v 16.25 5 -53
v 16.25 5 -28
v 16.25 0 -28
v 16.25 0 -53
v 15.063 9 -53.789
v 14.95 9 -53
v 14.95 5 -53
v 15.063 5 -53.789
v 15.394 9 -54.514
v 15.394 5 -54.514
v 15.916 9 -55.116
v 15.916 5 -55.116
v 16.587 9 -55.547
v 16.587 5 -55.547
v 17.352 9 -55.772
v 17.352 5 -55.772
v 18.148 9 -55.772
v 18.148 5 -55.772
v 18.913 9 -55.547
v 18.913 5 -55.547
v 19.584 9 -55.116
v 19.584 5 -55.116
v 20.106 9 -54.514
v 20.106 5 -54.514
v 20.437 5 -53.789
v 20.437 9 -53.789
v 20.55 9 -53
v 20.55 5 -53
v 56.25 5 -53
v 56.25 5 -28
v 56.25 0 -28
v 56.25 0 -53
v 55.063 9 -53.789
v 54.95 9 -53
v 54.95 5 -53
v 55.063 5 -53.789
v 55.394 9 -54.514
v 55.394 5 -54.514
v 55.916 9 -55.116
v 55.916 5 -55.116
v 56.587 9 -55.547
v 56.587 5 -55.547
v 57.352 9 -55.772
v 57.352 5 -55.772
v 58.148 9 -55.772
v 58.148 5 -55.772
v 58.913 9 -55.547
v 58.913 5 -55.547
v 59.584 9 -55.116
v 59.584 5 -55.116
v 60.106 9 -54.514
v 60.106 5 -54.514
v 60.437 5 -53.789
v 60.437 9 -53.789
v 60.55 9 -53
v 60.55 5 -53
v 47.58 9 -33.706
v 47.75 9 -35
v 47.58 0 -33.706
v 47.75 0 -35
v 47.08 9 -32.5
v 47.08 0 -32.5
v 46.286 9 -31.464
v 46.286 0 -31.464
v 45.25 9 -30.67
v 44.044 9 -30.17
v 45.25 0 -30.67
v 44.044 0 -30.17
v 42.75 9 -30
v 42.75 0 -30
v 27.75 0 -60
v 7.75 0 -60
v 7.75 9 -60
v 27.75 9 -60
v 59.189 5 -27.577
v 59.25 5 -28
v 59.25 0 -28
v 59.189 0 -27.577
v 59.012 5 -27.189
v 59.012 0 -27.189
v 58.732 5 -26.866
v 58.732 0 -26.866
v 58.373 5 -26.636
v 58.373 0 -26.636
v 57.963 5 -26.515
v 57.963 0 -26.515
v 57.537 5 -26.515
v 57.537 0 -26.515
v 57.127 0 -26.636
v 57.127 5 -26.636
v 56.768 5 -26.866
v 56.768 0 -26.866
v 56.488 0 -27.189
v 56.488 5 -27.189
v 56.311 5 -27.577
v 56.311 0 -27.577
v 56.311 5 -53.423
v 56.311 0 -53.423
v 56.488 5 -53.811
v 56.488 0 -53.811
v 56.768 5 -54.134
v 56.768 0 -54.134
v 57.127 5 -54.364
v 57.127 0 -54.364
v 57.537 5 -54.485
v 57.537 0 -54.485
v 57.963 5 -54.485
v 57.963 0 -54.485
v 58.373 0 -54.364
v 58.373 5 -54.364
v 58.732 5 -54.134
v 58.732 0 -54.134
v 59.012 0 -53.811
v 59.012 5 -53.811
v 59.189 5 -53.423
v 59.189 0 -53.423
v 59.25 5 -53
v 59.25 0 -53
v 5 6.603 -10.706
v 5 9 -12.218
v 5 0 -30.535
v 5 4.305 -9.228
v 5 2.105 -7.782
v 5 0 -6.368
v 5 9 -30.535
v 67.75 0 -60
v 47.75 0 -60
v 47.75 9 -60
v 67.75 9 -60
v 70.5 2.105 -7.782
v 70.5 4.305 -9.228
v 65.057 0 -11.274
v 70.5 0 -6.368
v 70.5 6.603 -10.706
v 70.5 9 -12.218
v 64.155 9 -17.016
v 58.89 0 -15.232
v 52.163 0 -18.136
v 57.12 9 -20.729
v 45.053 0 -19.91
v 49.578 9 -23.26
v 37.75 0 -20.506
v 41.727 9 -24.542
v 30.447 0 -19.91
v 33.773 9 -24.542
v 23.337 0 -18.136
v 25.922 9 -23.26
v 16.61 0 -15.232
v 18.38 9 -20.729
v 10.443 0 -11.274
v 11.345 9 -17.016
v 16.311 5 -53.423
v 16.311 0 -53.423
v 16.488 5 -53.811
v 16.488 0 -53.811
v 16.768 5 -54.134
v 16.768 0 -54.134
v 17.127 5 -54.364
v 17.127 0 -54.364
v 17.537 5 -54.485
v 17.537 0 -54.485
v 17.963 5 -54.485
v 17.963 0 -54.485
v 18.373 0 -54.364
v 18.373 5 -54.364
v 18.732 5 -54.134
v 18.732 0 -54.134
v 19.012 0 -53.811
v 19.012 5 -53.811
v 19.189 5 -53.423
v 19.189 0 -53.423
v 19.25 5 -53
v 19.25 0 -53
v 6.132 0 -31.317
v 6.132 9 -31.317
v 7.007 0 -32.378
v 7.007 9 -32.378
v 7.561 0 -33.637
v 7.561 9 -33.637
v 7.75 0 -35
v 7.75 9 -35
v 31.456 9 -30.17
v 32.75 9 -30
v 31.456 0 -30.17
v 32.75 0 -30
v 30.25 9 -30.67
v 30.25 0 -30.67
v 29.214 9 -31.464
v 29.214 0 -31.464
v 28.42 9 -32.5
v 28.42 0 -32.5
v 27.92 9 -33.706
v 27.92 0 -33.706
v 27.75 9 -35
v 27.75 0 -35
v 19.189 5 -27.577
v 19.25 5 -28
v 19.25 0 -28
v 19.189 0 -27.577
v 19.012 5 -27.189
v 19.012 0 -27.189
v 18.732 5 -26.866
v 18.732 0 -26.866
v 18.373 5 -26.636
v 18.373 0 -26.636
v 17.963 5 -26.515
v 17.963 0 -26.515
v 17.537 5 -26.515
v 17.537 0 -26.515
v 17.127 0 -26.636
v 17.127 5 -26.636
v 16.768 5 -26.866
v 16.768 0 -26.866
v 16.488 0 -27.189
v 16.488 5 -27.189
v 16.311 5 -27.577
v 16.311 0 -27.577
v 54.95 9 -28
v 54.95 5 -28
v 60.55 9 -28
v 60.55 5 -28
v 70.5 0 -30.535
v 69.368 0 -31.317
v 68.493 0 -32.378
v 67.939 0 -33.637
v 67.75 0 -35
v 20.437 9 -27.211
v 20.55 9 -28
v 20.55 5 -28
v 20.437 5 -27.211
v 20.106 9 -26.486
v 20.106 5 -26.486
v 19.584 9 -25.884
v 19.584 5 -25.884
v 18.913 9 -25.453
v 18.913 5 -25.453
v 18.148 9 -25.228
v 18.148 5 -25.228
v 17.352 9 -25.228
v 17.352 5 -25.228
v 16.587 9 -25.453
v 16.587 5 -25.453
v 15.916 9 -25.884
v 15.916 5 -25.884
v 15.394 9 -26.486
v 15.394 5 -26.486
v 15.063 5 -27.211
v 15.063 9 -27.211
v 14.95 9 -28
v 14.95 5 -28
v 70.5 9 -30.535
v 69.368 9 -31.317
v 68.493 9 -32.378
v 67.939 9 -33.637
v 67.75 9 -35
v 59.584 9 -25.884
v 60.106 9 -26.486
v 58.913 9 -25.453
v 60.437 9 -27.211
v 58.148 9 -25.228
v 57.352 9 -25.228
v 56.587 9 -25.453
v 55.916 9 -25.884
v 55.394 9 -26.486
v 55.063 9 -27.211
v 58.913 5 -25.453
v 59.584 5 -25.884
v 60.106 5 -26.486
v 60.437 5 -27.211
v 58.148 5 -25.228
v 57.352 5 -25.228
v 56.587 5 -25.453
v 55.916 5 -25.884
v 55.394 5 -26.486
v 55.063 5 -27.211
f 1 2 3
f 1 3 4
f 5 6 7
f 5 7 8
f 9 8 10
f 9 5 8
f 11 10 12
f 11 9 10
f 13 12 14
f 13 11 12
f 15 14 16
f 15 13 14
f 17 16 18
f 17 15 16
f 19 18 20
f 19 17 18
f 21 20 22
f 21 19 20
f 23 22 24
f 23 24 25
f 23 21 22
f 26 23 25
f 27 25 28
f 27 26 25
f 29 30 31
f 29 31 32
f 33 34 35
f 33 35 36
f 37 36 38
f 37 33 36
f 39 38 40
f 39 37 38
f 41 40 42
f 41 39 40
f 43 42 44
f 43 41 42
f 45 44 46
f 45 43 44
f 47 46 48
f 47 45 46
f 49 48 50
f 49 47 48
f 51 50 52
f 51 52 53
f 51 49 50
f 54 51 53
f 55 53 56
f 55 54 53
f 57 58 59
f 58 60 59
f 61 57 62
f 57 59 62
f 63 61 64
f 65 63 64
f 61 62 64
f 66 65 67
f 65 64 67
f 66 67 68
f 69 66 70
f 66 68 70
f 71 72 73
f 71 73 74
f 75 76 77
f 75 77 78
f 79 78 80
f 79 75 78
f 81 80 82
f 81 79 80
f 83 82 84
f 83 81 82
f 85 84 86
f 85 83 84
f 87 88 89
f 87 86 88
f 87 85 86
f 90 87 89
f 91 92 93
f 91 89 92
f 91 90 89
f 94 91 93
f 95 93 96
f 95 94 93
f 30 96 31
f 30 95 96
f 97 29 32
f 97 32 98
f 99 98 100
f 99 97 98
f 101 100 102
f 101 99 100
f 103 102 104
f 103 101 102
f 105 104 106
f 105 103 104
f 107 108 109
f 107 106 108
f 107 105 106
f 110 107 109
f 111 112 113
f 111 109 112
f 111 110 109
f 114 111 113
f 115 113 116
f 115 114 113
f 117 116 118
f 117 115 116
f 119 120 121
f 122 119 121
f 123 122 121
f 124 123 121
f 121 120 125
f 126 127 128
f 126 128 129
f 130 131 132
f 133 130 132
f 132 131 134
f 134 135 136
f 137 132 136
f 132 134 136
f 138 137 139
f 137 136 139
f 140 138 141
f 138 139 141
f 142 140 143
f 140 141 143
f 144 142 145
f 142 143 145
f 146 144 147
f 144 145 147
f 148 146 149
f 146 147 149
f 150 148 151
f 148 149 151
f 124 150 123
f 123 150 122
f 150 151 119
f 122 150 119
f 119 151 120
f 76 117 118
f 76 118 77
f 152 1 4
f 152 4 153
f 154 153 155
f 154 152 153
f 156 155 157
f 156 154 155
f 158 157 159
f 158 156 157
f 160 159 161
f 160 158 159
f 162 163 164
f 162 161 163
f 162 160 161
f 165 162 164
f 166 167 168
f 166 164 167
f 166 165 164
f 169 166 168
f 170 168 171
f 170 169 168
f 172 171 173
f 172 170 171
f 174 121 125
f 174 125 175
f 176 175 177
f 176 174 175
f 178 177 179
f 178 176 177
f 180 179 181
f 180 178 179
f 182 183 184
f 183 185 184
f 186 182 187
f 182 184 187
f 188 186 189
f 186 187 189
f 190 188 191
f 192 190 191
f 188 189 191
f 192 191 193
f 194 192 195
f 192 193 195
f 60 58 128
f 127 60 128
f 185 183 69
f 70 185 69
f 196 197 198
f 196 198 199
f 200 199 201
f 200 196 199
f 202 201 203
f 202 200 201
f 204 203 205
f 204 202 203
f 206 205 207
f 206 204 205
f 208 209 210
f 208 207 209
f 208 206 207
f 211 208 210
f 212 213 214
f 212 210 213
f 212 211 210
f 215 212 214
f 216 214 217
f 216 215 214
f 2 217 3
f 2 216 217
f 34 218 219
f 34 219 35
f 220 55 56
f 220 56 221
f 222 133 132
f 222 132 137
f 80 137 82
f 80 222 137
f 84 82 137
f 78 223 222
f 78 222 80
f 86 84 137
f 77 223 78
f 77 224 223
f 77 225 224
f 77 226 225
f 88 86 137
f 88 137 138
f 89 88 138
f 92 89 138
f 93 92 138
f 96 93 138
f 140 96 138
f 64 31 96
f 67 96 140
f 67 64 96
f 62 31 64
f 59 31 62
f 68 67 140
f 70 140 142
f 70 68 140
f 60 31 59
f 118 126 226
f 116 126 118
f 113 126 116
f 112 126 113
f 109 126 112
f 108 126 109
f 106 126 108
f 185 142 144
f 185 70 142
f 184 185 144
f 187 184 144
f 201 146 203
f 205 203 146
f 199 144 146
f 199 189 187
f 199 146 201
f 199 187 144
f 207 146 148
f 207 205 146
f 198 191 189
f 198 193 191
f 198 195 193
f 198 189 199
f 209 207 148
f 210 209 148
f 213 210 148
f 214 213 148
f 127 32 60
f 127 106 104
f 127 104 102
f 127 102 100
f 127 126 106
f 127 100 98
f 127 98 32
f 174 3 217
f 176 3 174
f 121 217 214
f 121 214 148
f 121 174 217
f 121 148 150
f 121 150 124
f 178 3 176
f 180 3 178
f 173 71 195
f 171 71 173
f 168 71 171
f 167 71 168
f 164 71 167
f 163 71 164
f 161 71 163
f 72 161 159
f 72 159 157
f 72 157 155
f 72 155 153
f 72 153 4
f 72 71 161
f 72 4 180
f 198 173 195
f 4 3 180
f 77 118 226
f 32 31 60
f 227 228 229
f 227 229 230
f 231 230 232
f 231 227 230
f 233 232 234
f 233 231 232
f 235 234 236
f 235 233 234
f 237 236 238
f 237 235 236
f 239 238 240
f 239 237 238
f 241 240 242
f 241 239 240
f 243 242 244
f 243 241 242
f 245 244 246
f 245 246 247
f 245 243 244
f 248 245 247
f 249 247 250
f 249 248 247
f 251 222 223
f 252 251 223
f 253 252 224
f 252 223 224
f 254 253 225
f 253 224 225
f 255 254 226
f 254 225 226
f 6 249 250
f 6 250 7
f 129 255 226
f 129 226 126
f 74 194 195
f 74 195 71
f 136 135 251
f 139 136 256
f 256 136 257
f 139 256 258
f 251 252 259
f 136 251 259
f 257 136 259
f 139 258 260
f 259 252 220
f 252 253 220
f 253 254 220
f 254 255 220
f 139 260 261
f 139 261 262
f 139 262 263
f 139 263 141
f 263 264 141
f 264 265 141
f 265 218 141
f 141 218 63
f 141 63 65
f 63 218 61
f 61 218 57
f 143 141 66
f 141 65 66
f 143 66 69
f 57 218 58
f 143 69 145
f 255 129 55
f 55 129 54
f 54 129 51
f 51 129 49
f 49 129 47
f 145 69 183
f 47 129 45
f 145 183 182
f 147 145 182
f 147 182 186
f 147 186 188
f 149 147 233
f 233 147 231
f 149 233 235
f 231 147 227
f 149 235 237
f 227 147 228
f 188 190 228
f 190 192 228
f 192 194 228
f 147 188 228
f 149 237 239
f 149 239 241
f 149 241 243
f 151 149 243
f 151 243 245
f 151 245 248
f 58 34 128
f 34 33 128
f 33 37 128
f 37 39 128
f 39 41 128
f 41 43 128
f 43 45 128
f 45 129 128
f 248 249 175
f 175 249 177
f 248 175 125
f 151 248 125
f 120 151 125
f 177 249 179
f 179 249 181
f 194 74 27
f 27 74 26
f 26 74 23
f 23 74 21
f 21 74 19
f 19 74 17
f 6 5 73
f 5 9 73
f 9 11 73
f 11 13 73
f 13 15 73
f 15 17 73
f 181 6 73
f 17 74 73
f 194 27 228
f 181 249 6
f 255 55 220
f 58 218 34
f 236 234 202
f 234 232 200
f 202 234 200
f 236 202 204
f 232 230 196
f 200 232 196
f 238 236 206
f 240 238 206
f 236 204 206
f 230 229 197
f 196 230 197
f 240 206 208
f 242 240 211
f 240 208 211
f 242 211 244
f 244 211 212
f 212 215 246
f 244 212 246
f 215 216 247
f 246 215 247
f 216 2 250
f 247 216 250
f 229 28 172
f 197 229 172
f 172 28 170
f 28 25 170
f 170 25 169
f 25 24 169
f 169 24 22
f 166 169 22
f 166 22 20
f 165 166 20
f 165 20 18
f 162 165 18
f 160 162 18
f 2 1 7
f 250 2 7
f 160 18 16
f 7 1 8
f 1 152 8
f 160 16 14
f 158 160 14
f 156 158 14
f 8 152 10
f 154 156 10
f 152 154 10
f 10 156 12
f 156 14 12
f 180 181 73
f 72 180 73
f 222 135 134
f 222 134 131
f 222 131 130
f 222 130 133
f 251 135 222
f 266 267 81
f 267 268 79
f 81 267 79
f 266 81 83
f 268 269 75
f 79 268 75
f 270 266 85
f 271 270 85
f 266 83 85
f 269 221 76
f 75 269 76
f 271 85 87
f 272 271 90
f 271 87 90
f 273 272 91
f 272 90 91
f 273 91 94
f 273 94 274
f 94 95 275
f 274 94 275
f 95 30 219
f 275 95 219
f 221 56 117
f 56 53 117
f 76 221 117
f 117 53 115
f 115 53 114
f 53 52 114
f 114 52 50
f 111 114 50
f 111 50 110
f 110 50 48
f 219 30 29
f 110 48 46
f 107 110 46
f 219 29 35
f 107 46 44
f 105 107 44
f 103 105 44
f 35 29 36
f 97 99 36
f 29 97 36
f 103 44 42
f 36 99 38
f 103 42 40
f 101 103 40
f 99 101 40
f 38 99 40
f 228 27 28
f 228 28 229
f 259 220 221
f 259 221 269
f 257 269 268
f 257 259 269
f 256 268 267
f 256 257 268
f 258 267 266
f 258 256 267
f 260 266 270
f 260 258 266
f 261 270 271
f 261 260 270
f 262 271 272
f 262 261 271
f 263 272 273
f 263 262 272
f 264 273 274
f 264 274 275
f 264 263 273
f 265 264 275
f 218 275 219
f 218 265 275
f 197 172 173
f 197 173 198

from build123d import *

# Parameters (mm, degrees)
BOSS_EXTRUDE1_DEPTH = 9
CUT_EXTRUDE2_REACH  = 98.857
SKETCH5_W           = 20
SKETCH5_H           = 30
SKETCH5_W_2         = 7.75
CUT_EXTRUDE3_DEPTH  = 10
FILLET1_R           = 5
CUT_EXTRUDE4_DEPTH  = 4
CHAMFER1_SIZE       = 9
CHAMFER1_SIZE_2     = 4.196768923
CUT_EXTRUDE5_REACH  = 98.857
SKETCH7_W           = 5
SKETCH7_H           = 33.085129134
SKETCH7_H_2         = 33.745309592


with BuildPart() as part:
    # Sketch1 → Boss-Extrude1 (new body)
    with BuildSketch(Plane(origin=(0, 0, 0), x_dir=(1, 0, 0), z_dir=(0, 1, 0))):
        with BuildLine():
            Line((0, 0), (0, 60))
            Line((0, 60), (75.5, 60))
            Line((75.5, 60), (75.5, 0))
            ThreePointArc((75.5, 0), (37.75, 20.506378381), (0, 0))
        make_face()
    extrude(amount=BOSS_EXTRUDE1_DEPTH)

    # Sketch4 → Cut-Extrude2 (cut, up to next)
    with BuildSketch(Plane(origin=(0, 9, 0), x_dir=(1, 0, 0), z_dir=(0, 1, 0)), mode=Mode.PRIVATE) as cut_extrude2_sk1:
        with BuildLine():
            Line((19.25, 53), (19.25, 28))
            ThreePointArc((19.25, 28), (17.75, 26.5), (16.25, 28))
            Line((16.25, 28), (16.25, 53))
            ThreePointArc((16.25, 53), (17.75, 54.5), (19.25, 53))
        make_face()
    cut_extrude2_tool1 = extrude(cut_extrude2_sk1.sketch, amount=-CUT_EXTRUDE2_REACH, mode=Mode.PRIVATE) & part.part
    # Sketch4 → Cut-Extrude2 (cut, up to next)
    with BuildSketch(Plane(origin=(0, 9, 0), x_dir=(1, 0, 0), z_dir=(0, 1, 0)), mode=Mode.PRIVATE) as cut_extrude2_sk2:
        with BuildLine():
            Line((59.25, 53), (59.25, 28))
            ThreePointArc((59.25, 28), (57.75, 26.5), (56.25, 28))
            Line((56.25, 28), (56.25, 53))
            ThreePointArc((56.25, 53), (57.75, 54.5), (59.25, 53))
        make_face()
    cut_extrude2_tool2 = extrude(cut_extrude2_sk2.sketch, amount=-CUT_EXTRUDE2_REACH, mode=Mode.PRIVATE) & part.part
    add(cut_extrude2_tool1.solids().sort_by_distance((17.75, 9, -40.5))[0], mode=Mode.SUBTRACT)
    add(cut_extrude2_tool2.solids().sort_by_distance((57.75, 9, -40.5))[0], mode=Mode.SUBTRACT)

    # Sketch5 → Cut-Extrude3 (cut)
    with BuildSketch(Plane(origin=(0, 9, 0), x_dir=(1, 0, 0), z_dir=(0, 1, 0))):
        with Locations((37.75, 45)):
            Rectangle(SKETCH5_W, SKETCH5_H)
        with Locations((71.625, 45)):
            Rectangle(SKETCH5_W_2, SKETCH5_H)
        with Locations((3.875, 45)):
            Rectangle(SKETCH5_W_2, SKETCH5_H)
    extrude(amount=-CUT_EXTRUDE3_DEPTH, mode=Mode.SUBTRACT)

    # Fillet1
    fillet1_edges = [part.edges().sort_by_distance(p)[0] for p in [
        (27.75, 4.5, -30),
        (47.75, 4.5, -30),
        (7.75, 4.5, -30),
        (67.75, 4.5, -30),
    ]]
    fillet(fillet1_edges, radius=FILLET1_R)

    # Sketch6 → Cut-Extrude4 (cut)
    with BuildSketch(Plane(origin=(0, 9, 0), x_dir=(1, 0, 0), z_dir=(0, 1, 0))):
        with BuildLine():
            Line((20.55, 53), (20.55, 28))
            ThreePointArc((20.55, 28), (17.75, 25.2), (14.95, 28))
            Line((14.95, 28), (14.95, 53))
            ThreePointArc((14.95, 53), (17.75, 55.8), (20.55, 53))
        make_face()
        with BuildLine():
            Line((60.55, 53), (60.55, 28))
            ThreePointArc((60.55, 28), (57.75, 25.2), (54.95, 28))
            Line((54.95, 28), (54.95, 53))
            ThreePointArc((54.95, 53), (57.75, 55.8), (60.55, 53))
        make_face()
    extrude(amount=-CUT_EXTRUDE4_DEPTH, mode=Mode.SUBTRACT)

    # Chamfer1
    # the kernel refuses this chamfer: 9, 4.196768923 mm, written as the material it takes off along each edge
    with BuildSketch(Plane(origin=(37.75, 9, 24.493621619), x_dir=(0.9983743289729347, 0, -0.05699736176212511), z_dir=(0.05699736176212511, 0, 0.9983743289729347))) as chamfer1_piece_1:
        Polygon((45, -CHAMFER1_SIZE), (45 + CHAMFER1_SIZE_2, 0), (45, 0), align=None)
    revolve(axis=Axis((37.75, 9, 24.493621619), (0, 1, 0)), revolution_arc=173.465041841, mode=Mode.SUBTRACT)

    # Sketch7 → Cut-Extrude5 (cut, up to next)
    with BuildSketch(Plane(origin=(0, 9, 0), x_dir=(1, 0, 0), z_dir=(0, 1, 0)), mode=Mode.PRIVATE) as cut_extrude5_sk1:
        with Locations((2.5, 16.542564567)):
            Rectangle(SKETCH7_W, SKETCH7_H)
    cut_extrude5_tool1 = extrude(cut_extrude5_sk1.sketch, amount=-CUT_EXTRUDE5_REACH, mode=Mode.PRIVATE) & part.part
    # Sketch7 → Cut-Extrude5 (cut, up to next)
    with BuildSketch(Plane(origin=(0, 9, 0), x_dir=(1, 0, 0), z_dir=(0, 1, 0)), mode=Mode.PRIVATE) as cut_extrude5_sk2:
        with Locations((73, 16.872654796)):
            Rectangle(SKETCH7_W, SKETCH7_H_2)
    cut_extrude5_tool2 = extrude(cut_extrude5_sk2.sketch, amount=-CUT_EXTRUDE5_REACH, mode=Mode.PRIVATE) & part.part
    add(cut_extrude5_tool1.solids().sort_by_distance((2.5, 9, -16.542565))[0], mode=Mode.SUBTRACT)
    add(cut_extrude5_tool2.solids().sort_by_distance((73, 9, -16.872655))[0], mode=Mode.SUBTRACT)


solid = part.part
